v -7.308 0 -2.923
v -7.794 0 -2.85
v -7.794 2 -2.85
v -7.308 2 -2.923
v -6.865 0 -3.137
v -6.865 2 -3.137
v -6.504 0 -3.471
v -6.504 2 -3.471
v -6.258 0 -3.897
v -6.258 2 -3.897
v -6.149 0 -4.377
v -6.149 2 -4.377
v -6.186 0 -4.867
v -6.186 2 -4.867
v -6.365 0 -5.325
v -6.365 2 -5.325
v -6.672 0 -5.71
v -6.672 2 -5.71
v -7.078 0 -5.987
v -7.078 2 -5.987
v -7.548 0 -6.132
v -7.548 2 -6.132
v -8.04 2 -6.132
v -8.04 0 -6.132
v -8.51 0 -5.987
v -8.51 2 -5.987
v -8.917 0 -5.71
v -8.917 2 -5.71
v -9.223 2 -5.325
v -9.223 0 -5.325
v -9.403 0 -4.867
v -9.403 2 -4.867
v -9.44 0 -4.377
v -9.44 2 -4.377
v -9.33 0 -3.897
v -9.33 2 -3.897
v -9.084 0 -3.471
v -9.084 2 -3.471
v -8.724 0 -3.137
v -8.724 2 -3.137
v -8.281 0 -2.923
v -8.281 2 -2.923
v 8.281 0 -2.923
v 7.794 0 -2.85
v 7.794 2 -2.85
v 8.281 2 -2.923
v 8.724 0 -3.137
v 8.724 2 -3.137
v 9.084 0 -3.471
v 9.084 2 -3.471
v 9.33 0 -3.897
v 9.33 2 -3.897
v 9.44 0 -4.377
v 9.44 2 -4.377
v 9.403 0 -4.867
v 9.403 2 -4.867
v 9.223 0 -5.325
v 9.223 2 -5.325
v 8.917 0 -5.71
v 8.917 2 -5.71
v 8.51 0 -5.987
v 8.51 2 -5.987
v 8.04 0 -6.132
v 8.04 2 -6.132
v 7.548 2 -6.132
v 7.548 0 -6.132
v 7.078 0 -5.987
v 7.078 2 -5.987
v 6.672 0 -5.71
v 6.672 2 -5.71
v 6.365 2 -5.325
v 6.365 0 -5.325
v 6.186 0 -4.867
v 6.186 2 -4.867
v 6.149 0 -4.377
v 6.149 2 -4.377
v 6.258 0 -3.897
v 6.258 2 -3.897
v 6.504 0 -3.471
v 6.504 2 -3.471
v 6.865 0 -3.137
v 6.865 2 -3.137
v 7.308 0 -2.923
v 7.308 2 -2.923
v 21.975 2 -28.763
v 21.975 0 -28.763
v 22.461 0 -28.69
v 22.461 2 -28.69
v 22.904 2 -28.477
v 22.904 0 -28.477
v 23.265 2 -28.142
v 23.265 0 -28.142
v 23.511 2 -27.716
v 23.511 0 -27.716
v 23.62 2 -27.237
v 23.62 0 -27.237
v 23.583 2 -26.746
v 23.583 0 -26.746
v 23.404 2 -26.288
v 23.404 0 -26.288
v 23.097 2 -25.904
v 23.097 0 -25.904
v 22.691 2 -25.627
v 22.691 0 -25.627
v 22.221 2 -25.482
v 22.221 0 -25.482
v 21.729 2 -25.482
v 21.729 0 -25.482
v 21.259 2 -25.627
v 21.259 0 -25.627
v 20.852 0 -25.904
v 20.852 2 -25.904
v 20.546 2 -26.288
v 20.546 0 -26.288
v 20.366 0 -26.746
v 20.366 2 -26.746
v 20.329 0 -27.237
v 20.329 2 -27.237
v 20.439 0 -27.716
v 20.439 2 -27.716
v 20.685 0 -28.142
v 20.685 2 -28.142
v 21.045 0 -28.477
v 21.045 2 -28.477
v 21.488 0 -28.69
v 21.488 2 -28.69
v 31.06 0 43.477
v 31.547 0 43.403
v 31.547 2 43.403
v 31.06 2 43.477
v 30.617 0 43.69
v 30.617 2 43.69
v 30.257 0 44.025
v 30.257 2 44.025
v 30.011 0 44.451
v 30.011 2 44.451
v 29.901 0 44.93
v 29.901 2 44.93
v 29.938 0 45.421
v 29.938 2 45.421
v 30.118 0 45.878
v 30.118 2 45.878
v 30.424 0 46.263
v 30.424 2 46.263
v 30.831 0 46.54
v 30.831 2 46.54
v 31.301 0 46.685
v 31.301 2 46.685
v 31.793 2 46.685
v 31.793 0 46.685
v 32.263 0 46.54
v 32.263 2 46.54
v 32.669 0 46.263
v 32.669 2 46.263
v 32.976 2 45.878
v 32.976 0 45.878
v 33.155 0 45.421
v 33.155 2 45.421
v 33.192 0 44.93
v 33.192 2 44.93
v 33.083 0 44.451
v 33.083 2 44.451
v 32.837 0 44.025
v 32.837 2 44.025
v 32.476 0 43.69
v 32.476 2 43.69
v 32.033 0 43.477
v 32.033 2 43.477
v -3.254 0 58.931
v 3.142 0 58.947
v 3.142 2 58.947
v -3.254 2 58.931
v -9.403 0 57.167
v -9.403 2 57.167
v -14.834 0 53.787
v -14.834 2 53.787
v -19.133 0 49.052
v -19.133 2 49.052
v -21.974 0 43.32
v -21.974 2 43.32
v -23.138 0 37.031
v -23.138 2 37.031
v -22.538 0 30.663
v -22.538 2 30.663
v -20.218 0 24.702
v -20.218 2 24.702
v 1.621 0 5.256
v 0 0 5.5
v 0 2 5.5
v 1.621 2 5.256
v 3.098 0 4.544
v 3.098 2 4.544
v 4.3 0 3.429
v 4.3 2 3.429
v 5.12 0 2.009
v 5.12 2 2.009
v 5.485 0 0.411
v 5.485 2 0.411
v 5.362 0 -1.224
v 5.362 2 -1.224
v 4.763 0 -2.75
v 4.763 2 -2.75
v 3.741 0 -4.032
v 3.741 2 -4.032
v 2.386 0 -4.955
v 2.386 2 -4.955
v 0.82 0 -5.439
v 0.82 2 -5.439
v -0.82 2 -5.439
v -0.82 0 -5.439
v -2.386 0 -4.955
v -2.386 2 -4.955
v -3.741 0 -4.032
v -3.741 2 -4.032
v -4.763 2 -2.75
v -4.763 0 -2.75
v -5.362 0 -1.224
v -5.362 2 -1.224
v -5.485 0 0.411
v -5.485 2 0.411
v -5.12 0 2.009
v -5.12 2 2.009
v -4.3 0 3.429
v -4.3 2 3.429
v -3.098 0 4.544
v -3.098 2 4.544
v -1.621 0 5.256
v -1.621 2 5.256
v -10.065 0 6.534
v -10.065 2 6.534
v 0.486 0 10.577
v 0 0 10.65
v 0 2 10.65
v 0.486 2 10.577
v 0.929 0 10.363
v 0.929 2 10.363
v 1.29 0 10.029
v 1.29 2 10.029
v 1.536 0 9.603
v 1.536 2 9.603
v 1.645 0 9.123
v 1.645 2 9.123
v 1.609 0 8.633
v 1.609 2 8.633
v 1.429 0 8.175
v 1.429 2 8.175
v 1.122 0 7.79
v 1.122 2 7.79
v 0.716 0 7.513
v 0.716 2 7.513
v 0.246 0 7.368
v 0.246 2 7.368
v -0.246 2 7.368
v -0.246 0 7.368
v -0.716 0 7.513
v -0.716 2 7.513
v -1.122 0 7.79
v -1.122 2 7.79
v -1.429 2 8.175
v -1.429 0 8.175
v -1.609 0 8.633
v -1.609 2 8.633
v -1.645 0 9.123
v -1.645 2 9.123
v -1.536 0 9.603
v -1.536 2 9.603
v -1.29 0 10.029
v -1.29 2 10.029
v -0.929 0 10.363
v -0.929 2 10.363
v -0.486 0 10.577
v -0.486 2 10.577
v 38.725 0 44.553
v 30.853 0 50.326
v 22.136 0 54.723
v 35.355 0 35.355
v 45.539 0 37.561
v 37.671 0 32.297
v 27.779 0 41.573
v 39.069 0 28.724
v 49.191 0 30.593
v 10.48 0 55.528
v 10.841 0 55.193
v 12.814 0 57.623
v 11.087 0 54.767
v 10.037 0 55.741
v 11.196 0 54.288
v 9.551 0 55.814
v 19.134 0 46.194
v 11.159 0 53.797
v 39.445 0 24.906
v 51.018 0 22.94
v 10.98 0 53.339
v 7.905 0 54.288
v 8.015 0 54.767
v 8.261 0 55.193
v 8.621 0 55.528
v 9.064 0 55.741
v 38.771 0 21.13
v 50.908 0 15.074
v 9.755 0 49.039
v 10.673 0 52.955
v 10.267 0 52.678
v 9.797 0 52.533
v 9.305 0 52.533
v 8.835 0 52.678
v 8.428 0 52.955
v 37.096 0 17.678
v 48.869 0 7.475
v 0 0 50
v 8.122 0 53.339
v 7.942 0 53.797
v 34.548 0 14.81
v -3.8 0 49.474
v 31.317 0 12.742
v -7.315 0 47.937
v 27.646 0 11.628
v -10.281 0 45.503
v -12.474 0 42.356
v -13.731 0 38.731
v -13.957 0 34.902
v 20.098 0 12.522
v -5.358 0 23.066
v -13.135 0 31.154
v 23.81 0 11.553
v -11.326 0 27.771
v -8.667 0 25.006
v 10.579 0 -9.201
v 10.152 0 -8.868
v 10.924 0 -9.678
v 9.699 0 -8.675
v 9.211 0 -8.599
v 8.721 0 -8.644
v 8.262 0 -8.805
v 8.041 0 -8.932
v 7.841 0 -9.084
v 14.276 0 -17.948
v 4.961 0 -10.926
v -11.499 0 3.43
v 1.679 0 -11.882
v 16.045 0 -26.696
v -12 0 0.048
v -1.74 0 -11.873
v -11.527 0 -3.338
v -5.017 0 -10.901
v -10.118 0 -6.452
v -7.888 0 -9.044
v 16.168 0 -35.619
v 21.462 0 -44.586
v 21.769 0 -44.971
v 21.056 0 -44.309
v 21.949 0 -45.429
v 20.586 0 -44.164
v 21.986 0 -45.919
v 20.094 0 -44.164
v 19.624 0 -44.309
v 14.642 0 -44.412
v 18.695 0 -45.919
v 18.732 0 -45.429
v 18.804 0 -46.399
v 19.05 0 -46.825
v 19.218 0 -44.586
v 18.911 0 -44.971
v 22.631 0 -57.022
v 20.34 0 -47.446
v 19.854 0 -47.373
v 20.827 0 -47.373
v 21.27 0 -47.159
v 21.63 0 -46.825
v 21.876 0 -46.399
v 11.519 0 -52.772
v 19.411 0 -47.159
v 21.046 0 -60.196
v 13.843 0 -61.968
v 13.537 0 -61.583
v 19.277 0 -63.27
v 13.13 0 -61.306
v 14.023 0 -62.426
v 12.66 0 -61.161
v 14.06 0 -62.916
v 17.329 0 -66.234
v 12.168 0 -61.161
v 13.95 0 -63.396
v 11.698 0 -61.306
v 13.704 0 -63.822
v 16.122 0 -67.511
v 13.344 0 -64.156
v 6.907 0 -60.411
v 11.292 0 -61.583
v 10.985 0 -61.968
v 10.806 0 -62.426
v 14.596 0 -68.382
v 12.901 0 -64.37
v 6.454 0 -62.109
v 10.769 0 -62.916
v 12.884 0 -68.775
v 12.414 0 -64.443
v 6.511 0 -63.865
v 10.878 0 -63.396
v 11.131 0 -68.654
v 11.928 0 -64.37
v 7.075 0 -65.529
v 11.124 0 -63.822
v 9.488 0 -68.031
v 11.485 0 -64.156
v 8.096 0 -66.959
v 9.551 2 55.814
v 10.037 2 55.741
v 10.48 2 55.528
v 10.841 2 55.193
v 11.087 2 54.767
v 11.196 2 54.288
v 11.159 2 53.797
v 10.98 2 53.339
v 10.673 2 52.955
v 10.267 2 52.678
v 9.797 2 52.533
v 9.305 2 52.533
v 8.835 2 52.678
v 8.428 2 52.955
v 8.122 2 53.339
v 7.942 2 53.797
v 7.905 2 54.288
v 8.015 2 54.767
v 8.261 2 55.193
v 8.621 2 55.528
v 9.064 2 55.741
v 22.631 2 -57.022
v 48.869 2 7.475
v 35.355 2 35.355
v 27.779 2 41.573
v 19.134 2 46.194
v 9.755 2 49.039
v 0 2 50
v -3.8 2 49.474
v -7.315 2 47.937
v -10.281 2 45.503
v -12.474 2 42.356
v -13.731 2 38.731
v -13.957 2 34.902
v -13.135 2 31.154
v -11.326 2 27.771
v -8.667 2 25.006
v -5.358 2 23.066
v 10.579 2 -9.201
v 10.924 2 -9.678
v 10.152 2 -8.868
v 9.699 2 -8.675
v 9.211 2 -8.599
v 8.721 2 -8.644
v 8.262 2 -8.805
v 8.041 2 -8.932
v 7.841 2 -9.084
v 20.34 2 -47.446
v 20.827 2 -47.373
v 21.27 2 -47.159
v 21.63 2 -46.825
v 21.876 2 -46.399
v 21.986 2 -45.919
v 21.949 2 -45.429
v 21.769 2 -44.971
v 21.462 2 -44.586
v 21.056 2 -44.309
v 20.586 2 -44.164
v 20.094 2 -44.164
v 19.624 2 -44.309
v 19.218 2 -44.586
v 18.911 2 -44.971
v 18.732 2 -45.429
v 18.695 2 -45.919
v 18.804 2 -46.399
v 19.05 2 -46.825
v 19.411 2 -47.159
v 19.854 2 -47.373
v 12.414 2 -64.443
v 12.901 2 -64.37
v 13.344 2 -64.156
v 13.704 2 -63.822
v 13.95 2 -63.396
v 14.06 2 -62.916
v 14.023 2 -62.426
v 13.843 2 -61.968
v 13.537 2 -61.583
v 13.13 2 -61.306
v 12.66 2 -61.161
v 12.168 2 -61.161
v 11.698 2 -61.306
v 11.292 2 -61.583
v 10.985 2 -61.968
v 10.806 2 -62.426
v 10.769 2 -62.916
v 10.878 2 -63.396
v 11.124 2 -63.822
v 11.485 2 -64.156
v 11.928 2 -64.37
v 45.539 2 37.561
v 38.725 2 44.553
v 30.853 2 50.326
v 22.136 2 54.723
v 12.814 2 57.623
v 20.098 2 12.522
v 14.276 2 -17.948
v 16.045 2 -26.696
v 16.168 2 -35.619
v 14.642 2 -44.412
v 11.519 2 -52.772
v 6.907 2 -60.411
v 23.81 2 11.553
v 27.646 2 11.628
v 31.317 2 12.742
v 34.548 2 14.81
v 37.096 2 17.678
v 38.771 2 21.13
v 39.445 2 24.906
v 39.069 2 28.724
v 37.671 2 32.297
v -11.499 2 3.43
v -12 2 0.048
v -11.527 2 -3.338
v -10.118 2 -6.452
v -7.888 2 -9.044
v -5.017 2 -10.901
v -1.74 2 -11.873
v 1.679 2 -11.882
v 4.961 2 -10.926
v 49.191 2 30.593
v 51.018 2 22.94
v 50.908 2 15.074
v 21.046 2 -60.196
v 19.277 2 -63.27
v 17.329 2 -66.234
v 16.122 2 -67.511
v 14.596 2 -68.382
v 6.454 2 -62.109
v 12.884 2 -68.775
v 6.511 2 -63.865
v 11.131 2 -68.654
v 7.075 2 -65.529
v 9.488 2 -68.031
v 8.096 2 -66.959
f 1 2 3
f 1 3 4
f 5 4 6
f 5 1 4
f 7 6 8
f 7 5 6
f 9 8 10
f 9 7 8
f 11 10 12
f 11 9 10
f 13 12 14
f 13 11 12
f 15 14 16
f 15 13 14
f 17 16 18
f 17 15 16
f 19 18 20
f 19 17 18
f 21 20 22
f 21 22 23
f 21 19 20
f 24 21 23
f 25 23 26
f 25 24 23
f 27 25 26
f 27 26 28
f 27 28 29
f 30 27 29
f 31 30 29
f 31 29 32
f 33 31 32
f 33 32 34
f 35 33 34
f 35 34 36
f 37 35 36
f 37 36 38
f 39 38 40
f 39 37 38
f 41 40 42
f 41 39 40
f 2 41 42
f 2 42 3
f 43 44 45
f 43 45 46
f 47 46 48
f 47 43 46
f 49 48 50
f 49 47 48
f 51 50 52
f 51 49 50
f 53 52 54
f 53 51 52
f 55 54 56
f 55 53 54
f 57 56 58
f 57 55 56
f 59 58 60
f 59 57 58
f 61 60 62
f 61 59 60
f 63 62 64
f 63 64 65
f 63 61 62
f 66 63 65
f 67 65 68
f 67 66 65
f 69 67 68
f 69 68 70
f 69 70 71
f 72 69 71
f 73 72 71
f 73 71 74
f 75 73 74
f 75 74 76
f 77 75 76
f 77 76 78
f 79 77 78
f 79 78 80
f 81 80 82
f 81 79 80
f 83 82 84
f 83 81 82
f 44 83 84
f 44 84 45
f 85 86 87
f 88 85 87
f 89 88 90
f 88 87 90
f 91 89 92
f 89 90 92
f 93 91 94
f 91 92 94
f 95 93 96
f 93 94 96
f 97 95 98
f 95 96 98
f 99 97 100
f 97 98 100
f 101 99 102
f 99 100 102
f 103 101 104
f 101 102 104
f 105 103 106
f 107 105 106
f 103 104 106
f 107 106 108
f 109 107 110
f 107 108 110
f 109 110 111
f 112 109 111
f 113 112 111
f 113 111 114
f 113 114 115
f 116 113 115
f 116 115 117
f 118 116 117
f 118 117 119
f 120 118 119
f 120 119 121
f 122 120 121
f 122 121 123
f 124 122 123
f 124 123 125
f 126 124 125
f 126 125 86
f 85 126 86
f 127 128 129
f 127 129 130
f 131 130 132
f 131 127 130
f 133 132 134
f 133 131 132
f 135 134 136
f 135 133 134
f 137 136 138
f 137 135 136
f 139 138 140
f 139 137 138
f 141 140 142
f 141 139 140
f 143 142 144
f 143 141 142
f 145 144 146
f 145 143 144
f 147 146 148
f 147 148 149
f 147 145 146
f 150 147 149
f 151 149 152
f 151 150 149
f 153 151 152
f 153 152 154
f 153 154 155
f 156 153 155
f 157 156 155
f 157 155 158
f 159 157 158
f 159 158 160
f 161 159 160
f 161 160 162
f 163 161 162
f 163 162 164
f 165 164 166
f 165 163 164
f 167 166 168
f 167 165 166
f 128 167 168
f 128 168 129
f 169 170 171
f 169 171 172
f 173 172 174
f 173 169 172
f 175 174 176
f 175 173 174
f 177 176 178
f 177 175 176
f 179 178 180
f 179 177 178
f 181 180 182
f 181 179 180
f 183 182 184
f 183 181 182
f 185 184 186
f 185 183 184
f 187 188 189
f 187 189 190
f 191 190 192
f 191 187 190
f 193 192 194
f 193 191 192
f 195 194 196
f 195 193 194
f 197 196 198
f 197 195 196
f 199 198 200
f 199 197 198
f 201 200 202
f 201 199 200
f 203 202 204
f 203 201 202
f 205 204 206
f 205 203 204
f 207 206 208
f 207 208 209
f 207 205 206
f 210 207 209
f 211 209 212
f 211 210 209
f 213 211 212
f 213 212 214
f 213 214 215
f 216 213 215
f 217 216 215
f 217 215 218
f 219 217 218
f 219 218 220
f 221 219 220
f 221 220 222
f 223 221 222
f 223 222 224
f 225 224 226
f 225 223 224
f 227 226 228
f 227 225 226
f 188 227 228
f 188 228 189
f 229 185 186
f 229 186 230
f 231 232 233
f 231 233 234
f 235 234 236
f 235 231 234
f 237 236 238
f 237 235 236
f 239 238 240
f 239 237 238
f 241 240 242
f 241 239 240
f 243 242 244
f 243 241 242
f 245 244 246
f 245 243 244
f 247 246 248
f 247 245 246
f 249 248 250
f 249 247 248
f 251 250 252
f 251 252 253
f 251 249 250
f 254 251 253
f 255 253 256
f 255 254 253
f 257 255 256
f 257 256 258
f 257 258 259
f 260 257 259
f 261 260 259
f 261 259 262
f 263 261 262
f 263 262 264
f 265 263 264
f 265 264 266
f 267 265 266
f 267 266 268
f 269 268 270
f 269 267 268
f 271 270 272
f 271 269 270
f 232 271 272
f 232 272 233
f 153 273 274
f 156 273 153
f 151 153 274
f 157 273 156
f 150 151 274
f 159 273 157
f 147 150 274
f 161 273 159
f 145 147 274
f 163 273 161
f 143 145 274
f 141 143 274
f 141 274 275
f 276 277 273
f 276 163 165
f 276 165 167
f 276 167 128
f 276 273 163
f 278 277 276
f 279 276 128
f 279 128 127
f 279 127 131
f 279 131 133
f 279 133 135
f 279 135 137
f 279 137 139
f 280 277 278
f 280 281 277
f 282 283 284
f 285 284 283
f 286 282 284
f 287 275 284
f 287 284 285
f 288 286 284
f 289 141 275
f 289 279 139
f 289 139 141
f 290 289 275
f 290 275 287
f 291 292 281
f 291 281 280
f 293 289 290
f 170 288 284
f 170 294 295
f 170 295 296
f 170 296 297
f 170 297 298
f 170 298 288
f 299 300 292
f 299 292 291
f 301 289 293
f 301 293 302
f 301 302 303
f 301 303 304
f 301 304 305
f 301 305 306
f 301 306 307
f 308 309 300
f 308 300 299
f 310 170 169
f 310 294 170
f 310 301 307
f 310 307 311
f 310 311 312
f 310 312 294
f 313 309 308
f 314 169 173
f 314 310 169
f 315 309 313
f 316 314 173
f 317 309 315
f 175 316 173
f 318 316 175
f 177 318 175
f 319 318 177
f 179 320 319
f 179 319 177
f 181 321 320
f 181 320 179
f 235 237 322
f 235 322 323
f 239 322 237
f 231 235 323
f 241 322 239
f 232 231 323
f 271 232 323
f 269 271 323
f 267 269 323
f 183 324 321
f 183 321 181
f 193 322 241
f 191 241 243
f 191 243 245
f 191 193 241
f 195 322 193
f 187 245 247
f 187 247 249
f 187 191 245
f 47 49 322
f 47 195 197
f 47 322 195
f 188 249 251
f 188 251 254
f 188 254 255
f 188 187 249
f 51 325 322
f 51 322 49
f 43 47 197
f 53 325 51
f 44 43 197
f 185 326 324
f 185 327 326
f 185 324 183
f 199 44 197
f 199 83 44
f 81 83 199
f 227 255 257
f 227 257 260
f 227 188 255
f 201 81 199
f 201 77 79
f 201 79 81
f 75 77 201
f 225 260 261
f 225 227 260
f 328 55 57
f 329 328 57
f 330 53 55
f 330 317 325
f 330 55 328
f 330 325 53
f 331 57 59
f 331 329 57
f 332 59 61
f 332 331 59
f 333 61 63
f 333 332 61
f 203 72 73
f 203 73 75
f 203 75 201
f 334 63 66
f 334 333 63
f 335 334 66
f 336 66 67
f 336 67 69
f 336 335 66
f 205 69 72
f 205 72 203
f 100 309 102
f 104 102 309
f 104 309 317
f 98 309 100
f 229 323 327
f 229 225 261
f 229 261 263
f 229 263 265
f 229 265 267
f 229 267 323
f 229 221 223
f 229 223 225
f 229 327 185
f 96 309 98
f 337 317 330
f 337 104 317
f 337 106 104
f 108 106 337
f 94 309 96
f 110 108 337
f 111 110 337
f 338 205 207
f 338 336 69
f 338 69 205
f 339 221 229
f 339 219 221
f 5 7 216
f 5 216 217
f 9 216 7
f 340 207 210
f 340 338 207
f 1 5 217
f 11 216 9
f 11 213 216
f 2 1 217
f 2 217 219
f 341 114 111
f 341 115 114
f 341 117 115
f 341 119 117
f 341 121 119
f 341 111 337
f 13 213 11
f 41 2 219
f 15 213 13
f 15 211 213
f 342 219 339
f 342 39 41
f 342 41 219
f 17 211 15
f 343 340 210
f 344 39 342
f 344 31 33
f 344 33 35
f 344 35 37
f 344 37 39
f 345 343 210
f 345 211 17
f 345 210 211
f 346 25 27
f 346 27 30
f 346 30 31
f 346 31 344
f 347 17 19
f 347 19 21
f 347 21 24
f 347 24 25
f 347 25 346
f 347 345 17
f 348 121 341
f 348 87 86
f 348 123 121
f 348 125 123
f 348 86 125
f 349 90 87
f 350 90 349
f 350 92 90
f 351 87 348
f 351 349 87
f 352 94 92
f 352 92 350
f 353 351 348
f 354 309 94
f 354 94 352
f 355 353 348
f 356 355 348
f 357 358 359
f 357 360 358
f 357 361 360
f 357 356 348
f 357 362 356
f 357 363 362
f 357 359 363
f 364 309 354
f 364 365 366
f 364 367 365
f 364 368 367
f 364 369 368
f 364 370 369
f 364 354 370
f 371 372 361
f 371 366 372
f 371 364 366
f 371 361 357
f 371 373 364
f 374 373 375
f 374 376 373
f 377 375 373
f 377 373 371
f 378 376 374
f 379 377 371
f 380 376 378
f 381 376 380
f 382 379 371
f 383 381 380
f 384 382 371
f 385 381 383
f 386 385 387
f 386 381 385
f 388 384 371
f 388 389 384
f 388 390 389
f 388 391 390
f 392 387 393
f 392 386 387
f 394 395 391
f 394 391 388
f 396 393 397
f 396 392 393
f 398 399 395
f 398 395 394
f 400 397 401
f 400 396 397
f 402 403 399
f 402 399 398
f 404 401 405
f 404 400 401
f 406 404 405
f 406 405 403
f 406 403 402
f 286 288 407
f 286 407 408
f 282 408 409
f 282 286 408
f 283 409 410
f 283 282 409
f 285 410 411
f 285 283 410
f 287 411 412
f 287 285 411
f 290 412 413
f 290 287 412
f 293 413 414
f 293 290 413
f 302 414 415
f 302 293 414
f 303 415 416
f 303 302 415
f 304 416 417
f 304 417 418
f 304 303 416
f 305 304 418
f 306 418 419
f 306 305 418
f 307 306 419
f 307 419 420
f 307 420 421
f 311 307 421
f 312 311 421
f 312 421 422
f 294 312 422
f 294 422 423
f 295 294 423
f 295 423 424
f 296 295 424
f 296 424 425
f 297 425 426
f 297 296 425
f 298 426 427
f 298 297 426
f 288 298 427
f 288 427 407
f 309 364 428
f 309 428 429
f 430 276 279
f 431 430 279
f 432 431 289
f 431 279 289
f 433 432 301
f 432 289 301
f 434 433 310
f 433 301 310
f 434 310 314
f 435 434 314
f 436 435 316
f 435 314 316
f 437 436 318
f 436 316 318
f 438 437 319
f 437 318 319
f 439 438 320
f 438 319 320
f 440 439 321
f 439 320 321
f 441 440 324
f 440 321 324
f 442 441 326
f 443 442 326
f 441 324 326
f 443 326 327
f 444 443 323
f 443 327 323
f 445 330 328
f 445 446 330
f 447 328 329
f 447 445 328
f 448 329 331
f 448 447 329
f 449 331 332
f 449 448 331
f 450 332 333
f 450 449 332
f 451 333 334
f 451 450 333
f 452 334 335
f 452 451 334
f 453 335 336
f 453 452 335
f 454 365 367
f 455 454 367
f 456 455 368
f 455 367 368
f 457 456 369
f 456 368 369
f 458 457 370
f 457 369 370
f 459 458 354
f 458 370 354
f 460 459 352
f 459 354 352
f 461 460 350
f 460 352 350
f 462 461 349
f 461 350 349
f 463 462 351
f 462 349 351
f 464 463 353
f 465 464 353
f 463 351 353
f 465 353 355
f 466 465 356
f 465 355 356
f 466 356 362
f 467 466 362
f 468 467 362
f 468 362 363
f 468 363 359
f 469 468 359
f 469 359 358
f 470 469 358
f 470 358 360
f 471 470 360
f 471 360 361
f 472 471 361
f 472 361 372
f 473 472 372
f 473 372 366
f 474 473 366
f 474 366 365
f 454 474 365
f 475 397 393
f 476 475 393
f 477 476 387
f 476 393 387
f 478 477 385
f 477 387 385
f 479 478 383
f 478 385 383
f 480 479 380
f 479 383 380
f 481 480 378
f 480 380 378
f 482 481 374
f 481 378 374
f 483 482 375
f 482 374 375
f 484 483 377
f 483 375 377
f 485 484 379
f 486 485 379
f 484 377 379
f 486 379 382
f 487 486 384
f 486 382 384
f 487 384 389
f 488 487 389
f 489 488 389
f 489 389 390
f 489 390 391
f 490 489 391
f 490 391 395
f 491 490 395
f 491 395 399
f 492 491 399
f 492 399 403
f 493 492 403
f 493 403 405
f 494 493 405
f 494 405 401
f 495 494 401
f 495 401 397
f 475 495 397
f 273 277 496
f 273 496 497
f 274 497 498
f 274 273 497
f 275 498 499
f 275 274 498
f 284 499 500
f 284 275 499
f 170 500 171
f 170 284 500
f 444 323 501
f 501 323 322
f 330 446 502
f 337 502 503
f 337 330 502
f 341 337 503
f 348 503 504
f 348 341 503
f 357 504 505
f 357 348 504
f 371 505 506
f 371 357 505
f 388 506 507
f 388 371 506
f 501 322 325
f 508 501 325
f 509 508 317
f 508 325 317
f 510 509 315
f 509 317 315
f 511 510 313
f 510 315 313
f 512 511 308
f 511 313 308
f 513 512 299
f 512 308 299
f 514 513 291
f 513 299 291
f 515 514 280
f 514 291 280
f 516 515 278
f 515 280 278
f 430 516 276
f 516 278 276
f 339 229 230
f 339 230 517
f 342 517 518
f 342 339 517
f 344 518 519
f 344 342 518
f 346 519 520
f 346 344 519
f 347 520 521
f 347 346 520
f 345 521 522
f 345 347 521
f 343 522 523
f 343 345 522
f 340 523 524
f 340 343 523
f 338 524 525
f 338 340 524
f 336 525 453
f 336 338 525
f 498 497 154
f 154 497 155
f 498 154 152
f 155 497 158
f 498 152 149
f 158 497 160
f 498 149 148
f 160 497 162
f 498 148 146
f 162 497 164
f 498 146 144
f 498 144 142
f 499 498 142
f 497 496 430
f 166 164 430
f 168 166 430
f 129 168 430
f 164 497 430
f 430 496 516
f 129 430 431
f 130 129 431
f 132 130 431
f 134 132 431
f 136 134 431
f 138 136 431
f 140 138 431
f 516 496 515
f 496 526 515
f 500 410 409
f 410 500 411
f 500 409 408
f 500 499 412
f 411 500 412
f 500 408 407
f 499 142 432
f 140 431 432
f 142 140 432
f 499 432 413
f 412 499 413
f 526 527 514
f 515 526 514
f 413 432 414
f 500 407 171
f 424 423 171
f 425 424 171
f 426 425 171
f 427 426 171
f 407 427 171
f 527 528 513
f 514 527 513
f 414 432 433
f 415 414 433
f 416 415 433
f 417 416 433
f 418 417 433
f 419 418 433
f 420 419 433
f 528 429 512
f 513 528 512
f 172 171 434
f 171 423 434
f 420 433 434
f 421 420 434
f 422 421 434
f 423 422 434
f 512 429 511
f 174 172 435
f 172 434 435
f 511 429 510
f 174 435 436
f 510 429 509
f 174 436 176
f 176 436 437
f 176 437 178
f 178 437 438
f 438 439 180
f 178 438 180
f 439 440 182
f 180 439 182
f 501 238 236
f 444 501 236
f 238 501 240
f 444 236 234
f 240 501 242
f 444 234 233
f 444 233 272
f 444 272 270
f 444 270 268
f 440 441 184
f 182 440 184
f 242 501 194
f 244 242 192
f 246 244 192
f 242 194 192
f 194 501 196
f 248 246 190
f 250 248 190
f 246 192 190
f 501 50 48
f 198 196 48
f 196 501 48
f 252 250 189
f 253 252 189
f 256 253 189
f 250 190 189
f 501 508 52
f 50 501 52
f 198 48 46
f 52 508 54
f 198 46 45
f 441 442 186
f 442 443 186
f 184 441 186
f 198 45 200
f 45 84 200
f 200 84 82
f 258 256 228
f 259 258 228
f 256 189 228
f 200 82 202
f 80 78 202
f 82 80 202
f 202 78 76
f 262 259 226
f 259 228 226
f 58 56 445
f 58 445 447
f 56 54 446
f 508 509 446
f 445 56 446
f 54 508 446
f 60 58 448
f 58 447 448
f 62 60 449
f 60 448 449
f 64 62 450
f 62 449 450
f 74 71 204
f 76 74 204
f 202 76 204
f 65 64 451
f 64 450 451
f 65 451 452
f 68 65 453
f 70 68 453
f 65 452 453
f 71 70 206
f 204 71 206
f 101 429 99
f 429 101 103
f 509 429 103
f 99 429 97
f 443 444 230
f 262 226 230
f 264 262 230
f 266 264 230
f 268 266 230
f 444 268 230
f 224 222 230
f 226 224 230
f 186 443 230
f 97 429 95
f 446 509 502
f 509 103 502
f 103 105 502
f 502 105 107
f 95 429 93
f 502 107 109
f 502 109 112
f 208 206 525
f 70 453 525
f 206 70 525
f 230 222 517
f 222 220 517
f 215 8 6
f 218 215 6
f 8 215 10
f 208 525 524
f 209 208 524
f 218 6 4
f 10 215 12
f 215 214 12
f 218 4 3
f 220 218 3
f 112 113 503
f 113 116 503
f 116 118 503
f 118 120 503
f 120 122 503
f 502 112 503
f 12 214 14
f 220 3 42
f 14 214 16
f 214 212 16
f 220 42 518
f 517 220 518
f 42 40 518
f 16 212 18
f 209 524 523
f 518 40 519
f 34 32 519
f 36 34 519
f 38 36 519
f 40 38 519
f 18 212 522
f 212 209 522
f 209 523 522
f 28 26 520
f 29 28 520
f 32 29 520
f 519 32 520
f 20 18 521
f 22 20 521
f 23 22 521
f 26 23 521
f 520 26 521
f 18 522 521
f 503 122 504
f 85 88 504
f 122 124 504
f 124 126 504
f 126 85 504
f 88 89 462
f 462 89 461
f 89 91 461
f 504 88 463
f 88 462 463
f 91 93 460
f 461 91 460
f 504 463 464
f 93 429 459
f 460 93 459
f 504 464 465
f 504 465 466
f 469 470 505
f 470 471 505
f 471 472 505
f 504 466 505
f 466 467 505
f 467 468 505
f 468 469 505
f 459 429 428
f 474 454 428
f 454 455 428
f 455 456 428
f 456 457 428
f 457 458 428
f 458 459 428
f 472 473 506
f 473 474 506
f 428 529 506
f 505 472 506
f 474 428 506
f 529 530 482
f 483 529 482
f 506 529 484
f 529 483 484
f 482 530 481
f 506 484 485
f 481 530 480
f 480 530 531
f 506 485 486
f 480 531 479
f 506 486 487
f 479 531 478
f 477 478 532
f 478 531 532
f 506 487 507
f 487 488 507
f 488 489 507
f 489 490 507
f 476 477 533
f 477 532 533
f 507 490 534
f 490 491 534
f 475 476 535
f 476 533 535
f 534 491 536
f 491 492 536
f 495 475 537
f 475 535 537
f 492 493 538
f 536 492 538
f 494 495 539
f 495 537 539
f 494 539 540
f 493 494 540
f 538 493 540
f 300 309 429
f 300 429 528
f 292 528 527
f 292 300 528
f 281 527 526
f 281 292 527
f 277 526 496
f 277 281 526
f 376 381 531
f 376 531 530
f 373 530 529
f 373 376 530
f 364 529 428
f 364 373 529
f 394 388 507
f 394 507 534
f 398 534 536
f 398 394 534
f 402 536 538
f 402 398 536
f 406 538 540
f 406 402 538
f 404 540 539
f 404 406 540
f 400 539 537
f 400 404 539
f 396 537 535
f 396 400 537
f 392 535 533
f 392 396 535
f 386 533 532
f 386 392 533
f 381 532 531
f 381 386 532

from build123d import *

# Parameters (mm, degrees)
SKETCH_1_R          = 1.65
SKETCH_1_R_2        = 5.5
EXTRUDE_1_DEPTH     = 2
SKETCH_2_R          = 1.65
CUT_EXTRUDE_1_DEPTH = 86.784644099
FILLET_1_R          = 2


with BuildPart() as part:
    # Эскиз1 → Бобышка-Вытянуть1 (new body)
    with BuildSketch(Plane(origin=(0, 0, 0), x_dir=(1, 0, 0), z_dir=(0, 1, 0))):
        with BuildLine():
            Line((22.63058135, 57.022094922), (48.869113703, -7.475462073))
            ThreePointArc((48.869113703, -7.475462073), (51.017863934, -22.940417651), (45.538728547, -37.5609872))
            ThreePointArc((45.538728547, -37.5609872), (26.585605536, -52.704925153), (3.142096023, -58.946847156))
            ThreePointArc((3.142096023, -58.946847156), (-19.13330087, -49.051718647), (-20.218209383, -24.701567755))
            Line((-20.218209383, -24.701567755), (-10.065450366, -6.533506633))
            ThreePointArc((-10.065450366, -6.533506633), (-6.891228037, 9.824000007), (9.569842381, 7.24003569))
            ThreePointArc((9.569842381, 7.24003569), (16.257964509, 34.227304723), (6.907279065, 60.411428714))
            ThreePointArc((6.907279065, 60.411428714), (9.487905153, 68.030832797), (17.329317504, 66.234391334))
            ThreePointArc((17.329317504, 66.234391334), (20.184340604, 61.745861093), (22.63058135, 57.022094922))
        make_face()
        with Locations(Location((9.550649772, -54.164426416, 0), (0, 0, 270))):
            Circle(SKETCH_1_R, mode=Mode.SUBTRACT)
        with Locations(Location((31.546703999, -45.053362436, 0), (0, 0, 90))):
            Circle(SKETCH_1_R, mode=Mode.SUBTRACT)
        with Locations(Location((0, 0, 0), (0, 0, 270))):
            Circle(SKETCH_1_R_2, mode=Mode.SUBTRACT)
        with Locations(Location((0, -9, 0), (0, 0, 270))):
            Circle(SKETCH_1_R, mode=Mode.SUBTRACT)
        with Locations(Location((-7.794228634, 4.5, 0), (0, 0, 270))):
            Circle(SKETCH_1_R, mode=Mode.SUBTRACT)
        with Locations(Location((7.794228634, 4.5, 0), (0, 0, 270))):
            Circle(SKETCH_1_R, mode=Mode.SUBTRACT)
        with BuildLine():
            Line((-5.357568053, -23.065686545), (20.09827607, -12.521530668))
            ThreePointArc((20.09827607, -12.521530668), (37.096418695, -17.67786086), (35.355339059, -35.355339059))
            ThreePointArc((35.355339059, -35.355339059), (19.134171618, -46.193976626), (0, -50))
            ThreePointArc((0, -50), (-13.730993926, -38.731264508), (-5.357568053, -23.065686545))
        make_face(mode=Mode.SUBTRACT)
    extrude(amount=EXTRUDE_1_DEPTH)

    # Эскиз2 → Вырез-Вытянуть1 (cut, through all)
    with BuildSketch(Plane.XZ):
        with Locations(Location((21.974708544, -27.113395045, 0), (0, 0, 270))):
            Circle(SKETCH_2_R)
        with Locations(Location((12.414405238, -62.792932716, 0), (0, 0, 270))):
            Circle(SKETCH_2_R)
        with Locations(Location((20.340189466, -45.796033589, 0), (0, 0, 270))):
            Circle(SKETCH_2_R)
    extrude(amount=-CUT_EXTRUDE_1_DEPTH, mode=Mode.SUBTRACT)

    # Скругление1
    fillet_1_edges = [part.edges().sort_by_distance(p)[0] for p in [
        (9.569842381, 1, -7.24003569),
    ]]
    fillet(fillet_1_edges, radius=FILLET_1_R)


solid = part.part
